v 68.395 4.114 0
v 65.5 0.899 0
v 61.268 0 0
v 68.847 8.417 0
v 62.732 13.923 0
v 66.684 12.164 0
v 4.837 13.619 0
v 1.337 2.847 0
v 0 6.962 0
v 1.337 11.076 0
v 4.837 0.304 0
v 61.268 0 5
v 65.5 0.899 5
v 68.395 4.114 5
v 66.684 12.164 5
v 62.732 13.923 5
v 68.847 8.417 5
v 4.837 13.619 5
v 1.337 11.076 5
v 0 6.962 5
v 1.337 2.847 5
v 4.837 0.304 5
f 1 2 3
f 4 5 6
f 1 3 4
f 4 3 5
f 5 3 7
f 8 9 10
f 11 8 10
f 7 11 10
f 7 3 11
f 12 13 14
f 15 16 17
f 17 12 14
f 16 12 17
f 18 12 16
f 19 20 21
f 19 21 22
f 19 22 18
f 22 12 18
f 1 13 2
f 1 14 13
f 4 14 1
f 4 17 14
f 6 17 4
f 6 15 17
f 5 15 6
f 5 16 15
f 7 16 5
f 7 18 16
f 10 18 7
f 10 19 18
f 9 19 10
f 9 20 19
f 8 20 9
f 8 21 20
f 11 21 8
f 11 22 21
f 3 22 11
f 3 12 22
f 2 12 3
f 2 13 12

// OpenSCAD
$fn = 32;

// ----------------------------------------------------------------------
// Lever arm: two bosses 14 and 14 mm, 55 mm between centres
// ----------------------------------------------------------------------

// --- parameters (mm) ---
profile_height = 5;       // extrusion height
profile_points = 11;      // points of the closed outline

profile = [[0, 6.962], [1.337, 2.847], [4.837, 0.304], [61.268, 0], [65.5, 0.899], [68.395, 4.114], [68.847, 8.417], [66.684, 12.164], [62.732, 13.923], [4.837, 13.619], [1.337, 11.076]];  // single closed polygon, 11 points, counter clockwise

// --- the one profile operation ---
linear_extrude(height = profile_height) polygon(points = profile);
